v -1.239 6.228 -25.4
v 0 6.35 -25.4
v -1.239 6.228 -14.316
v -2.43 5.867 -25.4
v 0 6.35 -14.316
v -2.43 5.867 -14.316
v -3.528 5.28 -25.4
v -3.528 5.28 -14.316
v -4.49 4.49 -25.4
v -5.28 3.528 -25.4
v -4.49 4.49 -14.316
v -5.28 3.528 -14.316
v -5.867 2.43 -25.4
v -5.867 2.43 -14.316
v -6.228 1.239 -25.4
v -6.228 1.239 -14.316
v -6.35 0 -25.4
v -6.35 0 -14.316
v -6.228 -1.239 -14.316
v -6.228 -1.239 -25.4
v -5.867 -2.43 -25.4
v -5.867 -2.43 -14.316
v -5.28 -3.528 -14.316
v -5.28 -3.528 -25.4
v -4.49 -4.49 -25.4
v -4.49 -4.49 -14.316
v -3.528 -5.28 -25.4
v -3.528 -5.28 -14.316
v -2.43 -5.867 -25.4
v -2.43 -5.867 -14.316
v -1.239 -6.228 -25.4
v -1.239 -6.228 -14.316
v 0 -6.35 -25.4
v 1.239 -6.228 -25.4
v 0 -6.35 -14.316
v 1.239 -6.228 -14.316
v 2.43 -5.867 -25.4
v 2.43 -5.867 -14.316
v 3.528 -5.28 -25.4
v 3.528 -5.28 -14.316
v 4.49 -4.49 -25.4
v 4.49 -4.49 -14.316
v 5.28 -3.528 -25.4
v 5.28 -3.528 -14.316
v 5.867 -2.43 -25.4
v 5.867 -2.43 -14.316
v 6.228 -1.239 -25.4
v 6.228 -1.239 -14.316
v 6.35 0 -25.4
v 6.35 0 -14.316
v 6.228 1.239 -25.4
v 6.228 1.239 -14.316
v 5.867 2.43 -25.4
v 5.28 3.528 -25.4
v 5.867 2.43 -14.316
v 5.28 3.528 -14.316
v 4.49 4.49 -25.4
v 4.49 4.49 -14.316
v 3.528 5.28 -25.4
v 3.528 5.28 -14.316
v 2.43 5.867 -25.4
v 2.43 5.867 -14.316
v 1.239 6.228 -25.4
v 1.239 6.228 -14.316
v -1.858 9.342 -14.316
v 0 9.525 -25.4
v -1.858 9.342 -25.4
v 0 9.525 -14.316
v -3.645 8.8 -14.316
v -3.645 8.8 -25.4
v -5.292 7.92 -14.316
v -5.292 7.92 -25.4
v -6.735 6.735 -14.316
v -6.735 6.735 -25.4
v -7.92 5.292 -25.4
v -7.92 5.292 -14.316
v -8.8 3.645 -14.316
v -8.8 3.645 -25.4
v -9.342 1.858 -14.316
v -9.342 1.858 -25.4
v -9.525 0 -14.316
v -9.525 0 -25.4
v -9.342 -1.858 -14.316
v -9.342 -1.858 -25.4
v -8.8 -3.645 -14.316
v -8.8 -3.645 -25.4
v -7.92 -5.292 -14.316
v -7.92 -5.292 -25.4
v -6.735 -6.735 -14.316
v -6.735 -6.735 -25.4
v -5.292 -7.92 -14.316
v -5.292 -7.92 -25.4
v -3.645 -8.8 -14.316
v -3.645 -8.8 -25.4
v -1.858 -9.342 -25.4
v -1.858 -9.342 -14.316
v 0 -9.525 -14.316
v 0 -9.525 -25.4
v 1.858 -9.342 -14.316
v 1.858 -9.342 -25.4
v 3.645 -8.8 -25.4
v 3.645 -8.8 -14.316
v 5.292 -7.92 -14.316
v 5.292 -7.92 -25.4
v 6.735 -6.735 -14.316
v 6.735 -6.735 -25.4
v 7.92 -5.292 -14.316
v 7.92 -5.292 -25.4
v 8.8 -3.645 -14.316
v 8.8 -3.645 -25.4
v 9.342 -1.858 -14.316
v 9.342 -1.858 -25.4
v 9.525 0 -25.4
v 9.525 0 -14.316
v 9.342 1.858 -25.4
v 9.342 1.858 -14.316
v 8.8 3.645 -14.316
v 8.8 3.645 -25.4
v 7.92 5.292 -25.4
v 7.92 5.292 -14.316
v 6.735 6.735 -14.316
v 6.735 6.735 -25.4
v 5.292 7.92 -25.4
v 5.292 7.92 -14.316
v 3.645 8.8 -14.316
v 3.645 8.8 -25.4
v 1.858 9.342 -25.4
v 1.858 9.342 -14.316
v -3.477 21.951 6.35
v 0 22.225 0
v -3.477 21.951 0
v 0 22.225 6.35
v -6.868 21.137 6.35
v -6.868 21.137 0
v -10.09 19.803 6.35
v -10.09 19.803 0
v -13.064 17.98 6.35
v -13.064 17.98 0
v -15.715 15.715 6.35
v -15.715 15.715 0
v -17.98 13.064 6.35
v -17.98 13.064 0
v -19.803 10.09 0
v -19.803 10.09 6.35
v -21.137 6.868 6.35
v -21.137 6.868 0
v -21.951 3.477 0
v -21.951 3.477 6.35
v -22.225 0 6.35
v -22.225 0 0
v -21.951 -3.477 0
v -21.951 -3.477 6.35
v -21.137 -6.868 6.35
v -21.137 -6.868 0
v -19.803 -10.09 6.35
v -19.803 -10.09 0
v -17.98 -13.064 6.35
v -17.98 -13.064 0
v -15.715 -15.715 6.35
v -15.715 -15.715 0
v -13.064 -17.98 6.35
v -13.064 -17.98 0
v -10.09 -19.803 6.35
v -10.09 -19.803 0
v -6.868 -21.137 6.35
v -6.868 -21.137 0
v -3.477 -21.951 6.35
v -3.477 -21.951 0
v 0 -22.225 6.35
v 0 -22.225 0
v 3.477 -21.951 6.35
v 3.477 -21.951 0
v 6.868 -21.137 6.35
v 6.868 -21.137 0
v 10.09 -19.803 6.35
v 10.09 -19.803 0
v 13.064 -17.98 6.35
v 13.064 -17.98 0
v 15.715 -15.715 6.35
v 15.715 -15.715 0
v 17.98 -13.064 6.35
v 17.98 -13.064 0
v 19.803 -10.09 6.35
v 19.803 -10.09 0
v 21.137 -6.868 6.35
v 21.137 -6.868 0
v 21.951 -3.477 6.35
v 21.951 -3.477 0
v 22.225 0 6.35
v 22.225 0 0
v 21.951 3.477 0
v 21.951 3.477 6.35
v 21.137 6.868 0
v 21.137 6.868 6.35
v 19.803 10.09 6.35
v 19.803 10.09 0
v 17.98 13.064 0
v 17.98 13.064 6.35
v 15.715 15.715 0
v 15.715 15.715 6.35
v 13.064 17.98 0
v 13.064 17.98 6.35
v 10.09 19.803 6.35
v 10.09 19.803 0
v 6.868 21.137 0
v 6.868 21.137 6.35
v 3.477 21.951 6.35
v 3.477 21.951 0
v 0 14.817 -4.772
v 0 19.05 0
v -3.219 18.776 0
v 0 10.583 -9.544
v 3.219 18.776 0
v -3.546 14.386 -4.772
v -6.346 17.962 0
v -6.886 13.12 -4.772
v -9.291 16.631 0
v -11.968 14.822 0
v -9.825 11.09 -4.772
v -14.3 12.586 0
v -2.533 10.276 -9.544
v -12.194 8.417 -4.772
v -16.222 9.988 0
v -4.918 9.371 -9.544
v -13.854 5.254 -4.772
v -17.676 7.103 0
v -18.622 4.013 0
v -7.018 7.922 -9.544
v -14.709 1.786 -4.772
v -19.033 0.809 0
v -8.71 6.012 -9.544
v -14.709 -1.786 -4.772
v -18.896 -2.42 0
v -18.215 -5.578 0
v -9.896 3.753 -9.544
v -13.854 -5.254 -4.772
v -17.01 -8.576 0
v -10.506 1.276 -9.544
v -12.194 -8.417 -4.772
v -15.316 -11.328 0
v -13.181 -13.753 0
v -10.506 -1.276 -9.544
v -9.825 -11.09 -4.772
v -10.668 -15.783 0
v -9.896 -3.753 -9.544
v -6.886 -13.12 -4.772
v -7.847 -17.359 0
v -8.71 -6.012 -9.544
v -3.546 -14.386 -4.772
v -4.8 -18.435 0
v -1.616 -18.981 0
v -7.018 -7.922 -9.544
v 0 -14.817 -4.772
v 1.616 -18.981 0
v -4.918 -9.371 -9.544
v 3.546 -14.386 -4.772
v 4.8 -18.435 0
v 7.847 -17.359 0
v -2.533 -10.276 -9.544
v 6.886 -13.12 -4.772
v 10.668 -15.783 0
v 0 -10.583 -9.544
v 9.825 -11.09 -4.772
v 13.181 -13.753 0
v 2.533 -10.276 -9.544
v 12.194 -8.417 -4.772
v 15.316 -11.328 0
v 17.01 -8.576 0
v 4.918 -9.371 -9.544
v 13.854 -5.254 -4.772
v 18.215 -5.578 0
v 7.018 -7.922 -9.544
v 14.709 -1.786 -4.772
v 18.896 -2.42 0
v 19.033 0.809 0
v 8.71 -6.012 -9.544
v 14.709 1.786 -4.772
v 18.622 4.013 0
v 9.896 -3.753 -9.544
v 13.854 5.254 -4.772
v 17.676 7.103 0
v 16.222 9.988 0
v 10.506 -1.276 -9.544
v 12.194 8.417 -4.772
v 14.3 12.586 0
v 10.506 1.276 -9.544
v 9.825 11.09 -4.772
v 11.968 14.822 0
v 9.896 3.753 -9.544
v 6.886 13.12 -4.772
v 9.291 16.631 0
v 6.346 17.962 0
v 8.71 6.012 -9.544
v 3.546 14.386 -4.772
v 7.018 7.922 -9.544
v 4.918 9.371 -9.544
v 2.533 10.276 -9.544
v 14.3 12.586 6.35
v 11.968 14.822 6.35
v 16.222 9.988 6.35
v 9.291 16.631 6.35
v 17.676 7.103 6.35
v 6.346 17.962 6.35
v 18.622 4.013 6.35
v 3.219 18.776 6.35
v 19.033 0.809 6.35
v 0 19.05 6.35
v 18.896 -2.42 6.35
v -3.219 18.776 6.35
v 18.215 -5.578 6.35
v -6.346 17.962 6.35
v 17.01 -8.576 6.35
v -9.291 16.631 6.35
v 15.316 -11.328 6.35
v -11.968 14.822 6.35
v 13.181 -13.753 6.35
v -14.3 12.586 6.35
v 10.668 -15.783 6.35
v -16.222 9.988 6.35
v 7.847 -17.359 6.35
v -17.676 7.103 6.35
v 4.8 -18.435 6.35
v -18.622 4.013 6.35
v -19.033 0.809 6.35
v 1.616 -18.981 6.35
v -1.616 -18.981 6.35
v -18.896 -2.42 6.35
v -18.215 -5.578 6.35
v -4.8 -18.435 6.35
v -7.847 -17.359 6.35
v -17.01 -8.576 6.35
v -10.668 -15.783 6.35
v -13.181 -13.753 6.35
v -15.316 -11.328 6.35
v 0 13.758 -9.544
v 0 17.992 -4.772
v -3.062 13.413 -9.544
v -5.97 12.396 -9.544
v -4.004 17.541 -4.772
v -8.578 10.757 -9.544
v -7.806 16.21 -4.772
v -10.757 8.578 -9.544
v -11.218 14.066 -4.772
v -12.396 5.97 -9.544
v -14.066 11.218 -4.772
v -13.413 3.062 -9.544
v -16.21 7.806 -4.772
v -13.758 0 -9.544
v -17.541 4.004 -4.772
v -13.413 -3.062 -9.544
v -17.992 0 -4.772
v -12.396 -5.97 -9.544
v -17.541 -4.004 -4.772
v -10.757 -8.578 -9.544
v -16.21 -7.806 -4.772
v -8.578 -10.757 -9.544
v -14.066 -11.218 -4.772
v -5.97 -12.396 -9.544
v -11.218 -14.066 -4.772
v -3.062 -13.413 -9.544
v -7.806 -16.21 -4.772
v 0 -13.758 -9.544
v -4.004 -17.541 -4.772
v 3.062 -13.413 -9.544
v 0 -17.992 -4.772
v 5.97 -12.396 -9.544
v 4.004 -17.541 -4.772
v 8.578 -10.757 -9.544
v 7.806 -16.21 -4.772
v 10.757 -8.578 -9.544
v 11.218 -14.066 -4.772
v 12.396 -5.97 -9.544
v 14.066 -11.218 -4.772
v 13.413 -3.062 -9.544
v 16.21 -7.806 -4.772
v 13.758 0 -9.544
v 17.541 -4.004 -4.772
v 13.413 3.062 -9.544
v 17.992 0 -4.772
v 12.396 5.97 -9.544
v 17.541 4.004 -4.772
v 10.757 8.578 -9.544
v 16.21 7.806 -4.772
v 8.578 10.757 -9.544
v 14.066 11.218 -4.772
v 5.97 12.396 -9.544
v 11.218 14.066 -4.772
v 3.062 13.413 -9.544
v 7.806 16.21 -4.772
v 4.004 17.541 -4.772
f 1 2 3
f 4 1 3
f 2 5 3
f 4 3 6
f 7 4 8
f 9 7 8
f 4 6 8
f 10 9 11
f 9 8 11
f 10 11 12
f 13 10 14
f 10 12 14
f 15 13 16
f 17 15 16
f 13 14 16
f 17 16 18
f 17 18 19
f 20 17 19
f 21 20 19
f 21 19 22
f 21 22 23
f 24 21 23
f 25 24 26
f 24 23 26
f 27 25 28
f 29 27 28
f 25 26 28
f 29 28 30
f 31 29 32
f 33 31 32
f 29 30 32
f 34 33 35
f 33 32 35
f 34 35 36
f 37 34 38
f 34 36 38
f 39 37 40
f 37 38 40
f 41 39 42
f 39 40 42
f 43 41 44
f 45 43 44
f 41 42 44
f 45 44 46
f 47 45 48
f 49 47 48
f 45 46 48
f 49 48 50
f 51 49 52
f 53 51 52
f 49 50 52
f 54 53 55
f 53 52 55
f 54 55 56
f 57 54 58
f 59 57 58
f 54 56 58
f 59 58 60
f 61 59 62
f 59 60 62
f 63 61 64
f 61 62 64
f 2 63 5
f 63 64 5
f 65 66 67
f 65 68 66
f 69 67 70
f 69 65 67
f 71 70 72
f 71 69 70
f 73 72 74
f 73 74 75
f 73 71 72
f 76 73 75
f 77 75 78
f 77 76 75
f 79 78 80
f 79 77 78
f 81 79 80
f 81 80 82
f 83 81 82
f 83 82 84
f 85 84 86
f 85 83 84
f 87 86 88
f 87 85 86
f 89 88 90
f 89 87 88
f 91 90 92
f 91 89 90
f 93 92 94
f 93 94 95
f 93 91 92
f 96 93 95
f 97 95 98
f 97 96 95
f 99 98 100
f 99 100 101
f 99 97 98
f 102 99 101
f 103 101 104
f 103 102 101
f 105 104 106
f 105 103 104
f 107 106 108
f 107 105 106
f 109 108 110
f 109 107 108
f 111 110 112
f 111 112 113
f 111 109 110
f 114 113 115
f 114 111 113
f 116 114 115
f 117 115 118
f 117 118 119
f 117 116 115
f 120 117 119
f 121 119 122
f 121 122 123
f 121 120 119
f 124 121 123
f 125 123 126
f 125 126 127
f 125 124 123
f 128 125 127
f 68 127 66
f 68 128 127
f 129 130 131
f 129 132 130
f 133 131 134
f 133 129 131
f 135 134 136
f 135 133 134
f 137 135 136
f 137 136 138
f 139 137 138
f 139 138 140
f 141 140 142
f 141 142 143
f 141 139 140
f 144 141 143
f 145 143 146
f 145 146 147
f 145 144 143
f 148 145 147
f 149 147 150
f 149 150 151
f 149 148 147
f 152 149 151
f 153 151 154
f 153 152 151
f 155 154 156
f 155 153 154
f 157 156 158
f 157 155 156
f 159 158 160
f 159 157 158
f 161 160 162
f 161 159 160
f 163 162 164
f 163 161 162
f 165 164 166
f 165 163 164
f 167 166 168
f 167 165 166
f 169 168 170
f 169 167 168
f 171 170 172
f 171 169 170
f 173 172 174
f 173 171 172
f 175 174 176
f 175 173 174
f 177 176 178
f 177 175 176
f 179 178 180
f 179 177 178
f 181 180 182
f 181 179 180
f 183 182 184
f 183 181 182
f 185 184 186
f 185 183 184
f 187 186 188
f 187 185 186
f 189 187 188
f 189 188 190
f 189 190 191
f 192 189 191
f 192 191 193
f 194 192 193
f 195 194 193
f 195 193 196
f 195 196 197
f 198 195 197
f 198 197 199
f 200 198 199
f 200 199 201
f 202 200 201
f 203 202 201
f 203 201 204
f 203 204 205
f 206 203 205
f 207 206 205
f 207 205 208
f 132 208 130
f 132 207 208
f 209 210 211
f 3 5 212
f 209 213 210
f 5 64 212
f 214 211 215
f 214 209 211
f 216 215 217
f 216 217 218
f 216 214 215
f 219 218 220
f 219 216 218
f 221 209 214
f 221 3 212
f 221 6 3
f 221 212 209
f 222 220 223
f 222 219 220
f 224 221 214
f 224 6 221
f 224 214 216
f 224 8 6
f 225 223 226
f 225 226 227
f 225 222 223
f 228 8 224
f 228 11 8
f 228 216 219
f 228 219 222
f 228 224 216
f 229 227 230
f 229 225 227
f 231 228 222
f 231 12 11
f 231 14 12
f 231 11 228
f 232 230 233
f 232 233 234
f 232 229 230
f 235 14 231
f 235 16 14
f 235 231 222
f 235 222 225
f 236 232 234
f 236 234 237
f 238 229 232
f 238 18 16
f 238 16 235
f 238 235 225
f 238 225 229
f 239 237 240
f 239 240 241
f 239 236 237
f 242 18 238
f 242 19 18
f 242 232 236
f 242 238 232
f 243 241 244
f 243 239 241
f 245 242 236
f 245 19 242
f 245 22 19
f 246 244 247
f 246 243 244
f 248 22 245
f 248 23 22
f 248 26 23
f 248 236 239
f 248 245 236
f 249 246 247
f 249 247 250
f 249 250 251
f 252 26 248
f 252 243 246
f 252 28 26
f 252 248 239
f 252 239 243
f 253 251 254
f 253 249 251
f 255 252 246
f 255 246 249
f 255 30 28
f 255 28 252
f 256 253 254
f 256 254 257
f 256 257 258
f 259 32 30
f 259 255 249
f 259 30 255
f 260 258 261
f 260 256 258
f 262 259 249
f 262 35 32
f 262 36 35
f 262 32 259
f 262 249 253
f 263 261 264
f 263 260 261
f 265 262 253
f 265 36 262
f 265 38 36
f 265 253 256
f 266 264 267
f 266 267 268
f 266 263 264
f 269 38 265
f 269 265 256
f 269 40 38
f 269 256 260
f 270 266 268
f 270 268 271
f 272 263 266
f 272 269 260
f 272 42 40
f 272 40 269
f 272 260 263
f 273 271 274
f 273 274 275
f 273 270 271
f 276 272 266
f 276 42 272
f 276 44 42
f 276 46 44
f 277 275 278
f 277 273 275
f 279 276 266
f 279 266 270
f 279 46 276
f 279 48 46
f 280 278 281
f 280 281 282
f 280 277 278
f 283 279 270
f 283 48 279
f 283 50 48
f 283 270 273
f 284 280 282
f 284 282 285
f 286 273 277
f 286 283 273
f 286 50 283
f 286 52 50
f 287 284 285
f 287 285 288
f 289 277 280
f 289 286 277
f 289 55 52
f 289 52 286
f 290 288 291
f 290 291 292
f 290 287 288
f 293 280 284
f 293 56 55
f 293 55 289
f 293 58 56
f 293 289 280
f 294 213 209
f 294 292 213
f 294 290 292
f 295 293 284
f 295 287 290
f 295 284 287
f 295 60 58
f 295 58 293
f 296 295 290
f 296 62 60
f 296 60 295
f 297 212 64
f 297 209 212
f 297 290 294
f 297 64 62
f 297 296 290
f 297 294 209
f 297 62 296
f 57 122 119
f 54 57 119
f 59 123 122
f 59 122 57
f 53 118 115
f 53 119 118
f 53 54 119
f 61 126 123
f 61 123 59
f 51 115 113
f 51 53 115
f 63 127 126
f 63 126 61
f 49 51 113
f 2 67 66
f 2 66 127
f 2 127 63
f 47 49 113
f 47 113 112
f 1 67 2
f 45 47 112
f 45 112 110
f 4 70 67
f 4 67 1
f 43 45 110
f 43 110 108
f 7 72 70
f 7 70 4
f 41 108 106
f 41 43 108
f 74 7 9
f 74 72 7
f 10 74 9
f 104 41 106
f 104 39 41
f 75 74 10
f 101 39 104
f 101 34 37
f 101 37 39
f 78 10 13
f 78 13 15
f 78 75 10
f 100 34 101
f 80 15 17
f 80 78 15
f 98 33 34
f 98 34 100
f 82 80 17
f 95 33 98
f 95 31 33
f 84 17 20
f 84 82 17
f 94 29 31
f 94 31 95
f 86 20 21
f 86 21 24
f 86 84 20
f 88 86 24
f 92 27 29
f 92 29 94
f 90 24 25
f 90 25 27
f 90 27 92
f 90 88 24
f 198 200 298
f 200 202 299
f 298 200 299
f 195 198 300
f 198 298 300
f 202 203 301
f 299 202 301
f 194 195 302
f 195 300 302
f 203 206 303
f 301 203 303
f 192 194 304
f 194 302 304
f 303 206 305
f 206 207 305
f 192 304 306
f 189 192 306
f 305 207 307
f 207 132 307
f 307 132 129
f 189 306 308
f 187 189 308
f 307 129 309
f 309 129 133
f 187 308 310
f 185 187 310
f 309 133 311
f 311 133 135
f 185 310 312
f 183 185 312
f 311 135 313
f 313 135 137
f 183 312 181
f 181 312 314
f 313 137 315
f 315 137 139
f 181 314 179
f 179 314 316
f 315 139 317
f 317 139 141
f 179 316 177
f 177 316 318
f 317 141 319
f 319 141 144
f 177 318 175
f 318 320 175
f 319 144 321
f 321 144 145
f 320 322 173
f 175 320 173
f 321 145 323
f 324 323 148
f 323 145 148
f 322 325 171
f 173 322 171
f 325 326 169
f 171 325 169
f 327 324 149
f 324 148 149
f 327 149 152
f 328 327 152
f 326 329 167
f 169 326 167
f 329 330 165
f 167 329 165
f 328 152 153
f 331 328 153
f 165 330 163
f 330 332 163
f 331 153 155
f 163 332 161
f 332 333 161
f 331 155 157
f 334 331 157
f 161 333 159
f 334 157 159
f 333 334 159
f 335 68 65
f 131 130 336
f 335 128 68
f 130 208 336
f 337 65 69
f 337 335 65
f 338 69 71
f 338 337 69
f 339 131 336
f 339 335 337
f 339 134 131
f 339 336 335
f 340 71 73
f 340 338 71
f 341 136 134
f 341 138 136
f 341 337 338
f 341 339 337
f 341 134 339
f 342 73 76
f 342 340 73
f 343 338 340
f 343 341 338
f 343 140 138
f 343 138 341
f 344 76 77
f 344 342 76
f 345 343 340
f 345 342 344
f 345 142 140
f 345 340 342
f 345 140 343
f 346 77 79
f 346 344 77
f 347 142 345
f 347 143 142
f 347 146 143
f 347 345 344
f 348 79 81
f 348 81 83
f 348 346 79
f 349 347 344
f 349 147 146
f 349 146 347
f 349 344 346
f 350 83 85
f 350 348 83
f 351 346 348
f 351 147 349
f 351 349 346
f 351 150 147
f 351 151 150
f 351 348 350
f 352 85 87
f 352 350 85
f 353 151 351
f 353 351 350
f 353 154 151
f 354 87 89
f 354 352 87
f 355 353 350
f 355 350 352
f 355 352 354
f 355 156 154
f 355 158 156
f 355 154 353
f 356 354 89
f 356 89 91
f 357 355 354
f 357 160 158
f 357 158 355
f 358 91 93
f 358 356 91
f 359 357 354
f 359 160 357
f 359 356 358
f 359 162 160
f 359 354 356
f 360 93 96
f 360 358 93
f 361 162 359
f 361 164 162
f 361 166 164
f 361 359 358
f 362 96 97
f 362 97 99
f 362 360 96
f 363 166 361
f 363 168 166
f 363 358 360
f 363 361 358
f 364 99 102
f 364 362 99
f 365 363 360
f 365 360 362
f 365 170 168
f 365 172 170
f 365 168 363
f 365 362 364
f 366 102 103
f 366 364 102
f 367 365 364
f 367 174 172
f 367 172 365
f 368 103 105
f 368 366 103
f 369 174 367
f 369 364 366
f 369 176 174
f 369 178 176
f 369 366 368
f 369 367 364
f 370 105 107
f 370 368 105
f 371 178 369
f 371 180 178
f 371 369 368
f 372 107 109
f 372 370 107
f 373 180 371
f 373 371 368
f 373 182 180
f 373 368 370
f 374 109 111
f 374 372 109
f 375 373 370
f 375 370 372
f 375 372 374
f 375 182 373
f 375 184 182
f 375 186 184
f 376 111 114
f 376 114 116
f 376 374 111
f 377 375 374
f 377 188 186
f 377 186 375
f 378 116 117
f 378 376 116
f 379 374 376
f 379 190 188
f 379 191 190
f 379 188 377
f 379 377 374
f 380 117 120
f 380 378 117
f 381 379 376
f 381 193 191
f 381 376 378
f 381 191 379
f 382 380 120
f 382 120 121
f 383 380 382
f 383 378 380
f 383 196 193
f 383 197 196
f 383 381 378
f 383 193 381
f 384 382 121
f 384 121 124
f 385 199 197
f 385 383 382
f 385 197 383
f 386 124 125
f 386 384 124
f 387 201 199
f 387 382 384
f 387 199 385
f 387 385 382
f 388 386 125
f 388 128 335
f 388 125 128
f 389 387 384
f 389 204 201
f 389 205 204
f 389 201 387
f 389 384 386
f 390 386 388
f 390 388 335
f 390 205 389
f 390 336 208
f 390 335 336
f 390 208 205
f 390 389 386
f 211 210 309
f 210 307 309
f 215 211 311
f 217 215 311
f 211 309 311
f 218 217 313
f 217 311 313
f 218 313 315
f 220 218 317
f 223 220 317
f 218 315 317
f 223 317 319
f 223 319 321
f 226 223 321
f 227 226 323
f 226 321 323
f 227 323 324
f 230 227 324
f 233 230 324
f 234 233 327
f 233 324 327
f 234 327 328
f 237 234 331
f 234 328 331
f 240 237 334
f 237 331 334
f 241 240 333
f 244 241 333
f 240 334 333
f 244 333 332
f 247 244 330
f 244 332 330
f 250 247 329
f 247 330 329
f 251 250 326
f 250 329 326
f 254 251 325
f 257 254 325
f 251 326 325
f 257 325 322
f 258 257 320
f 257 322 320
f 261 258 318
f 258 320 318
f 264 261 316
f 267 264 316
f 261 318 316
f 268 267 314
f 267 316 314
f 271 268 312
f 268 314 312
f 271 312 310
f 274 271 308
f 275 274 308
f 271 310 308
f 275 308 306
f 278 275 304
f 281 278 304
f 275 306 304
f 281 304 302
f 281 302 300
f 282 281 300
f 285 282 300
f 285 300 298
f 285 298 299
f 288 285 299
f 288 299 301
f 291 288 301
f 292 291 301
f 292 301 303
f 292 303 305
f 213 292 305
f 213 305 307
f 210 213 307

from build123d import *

# Parameters (mm, degrees)
F0_W     = 3.175
F0_H     = 6.35
F0_H_2   = 11.083638
F2_R     = 9.040902
F3_DEPTH = 9.525
F4_R     = 9.539088
F5_DEPTH = 25.4


with BuildPart() as f1:
    # F0 (on Right) → F1 (revolve)
    with BuildSketch(Plane.YZ):
        with Locations((20.6375, 3.175)):
            Rectangle(F0_W, F0_H)
        Polygon((9.525, -14.316362), (22.225, 0), (19.05, 0), (6.35, -14.316362), align=None)
        with Locations((7.9375, -19.858181)):
            Rectangle(F0_W, F0_H_2)
    revolve(axis=Axis((0, 0, -21.81005), (0, 0, 1)))


with BuildPart() as f3:
    # F2 (on Top) → F3 (new body)
    with BuildSketch(Plane.XY):
        Circle(F2_R)
    extrude(amount=F3_DEPTH)

    # F4 (on Top) → F5 (join)
    with BuildSketch(Plane.XY):
        Circle(F4_R)
    extrude(amount=F5_DEPTH)


solid = f1.part
